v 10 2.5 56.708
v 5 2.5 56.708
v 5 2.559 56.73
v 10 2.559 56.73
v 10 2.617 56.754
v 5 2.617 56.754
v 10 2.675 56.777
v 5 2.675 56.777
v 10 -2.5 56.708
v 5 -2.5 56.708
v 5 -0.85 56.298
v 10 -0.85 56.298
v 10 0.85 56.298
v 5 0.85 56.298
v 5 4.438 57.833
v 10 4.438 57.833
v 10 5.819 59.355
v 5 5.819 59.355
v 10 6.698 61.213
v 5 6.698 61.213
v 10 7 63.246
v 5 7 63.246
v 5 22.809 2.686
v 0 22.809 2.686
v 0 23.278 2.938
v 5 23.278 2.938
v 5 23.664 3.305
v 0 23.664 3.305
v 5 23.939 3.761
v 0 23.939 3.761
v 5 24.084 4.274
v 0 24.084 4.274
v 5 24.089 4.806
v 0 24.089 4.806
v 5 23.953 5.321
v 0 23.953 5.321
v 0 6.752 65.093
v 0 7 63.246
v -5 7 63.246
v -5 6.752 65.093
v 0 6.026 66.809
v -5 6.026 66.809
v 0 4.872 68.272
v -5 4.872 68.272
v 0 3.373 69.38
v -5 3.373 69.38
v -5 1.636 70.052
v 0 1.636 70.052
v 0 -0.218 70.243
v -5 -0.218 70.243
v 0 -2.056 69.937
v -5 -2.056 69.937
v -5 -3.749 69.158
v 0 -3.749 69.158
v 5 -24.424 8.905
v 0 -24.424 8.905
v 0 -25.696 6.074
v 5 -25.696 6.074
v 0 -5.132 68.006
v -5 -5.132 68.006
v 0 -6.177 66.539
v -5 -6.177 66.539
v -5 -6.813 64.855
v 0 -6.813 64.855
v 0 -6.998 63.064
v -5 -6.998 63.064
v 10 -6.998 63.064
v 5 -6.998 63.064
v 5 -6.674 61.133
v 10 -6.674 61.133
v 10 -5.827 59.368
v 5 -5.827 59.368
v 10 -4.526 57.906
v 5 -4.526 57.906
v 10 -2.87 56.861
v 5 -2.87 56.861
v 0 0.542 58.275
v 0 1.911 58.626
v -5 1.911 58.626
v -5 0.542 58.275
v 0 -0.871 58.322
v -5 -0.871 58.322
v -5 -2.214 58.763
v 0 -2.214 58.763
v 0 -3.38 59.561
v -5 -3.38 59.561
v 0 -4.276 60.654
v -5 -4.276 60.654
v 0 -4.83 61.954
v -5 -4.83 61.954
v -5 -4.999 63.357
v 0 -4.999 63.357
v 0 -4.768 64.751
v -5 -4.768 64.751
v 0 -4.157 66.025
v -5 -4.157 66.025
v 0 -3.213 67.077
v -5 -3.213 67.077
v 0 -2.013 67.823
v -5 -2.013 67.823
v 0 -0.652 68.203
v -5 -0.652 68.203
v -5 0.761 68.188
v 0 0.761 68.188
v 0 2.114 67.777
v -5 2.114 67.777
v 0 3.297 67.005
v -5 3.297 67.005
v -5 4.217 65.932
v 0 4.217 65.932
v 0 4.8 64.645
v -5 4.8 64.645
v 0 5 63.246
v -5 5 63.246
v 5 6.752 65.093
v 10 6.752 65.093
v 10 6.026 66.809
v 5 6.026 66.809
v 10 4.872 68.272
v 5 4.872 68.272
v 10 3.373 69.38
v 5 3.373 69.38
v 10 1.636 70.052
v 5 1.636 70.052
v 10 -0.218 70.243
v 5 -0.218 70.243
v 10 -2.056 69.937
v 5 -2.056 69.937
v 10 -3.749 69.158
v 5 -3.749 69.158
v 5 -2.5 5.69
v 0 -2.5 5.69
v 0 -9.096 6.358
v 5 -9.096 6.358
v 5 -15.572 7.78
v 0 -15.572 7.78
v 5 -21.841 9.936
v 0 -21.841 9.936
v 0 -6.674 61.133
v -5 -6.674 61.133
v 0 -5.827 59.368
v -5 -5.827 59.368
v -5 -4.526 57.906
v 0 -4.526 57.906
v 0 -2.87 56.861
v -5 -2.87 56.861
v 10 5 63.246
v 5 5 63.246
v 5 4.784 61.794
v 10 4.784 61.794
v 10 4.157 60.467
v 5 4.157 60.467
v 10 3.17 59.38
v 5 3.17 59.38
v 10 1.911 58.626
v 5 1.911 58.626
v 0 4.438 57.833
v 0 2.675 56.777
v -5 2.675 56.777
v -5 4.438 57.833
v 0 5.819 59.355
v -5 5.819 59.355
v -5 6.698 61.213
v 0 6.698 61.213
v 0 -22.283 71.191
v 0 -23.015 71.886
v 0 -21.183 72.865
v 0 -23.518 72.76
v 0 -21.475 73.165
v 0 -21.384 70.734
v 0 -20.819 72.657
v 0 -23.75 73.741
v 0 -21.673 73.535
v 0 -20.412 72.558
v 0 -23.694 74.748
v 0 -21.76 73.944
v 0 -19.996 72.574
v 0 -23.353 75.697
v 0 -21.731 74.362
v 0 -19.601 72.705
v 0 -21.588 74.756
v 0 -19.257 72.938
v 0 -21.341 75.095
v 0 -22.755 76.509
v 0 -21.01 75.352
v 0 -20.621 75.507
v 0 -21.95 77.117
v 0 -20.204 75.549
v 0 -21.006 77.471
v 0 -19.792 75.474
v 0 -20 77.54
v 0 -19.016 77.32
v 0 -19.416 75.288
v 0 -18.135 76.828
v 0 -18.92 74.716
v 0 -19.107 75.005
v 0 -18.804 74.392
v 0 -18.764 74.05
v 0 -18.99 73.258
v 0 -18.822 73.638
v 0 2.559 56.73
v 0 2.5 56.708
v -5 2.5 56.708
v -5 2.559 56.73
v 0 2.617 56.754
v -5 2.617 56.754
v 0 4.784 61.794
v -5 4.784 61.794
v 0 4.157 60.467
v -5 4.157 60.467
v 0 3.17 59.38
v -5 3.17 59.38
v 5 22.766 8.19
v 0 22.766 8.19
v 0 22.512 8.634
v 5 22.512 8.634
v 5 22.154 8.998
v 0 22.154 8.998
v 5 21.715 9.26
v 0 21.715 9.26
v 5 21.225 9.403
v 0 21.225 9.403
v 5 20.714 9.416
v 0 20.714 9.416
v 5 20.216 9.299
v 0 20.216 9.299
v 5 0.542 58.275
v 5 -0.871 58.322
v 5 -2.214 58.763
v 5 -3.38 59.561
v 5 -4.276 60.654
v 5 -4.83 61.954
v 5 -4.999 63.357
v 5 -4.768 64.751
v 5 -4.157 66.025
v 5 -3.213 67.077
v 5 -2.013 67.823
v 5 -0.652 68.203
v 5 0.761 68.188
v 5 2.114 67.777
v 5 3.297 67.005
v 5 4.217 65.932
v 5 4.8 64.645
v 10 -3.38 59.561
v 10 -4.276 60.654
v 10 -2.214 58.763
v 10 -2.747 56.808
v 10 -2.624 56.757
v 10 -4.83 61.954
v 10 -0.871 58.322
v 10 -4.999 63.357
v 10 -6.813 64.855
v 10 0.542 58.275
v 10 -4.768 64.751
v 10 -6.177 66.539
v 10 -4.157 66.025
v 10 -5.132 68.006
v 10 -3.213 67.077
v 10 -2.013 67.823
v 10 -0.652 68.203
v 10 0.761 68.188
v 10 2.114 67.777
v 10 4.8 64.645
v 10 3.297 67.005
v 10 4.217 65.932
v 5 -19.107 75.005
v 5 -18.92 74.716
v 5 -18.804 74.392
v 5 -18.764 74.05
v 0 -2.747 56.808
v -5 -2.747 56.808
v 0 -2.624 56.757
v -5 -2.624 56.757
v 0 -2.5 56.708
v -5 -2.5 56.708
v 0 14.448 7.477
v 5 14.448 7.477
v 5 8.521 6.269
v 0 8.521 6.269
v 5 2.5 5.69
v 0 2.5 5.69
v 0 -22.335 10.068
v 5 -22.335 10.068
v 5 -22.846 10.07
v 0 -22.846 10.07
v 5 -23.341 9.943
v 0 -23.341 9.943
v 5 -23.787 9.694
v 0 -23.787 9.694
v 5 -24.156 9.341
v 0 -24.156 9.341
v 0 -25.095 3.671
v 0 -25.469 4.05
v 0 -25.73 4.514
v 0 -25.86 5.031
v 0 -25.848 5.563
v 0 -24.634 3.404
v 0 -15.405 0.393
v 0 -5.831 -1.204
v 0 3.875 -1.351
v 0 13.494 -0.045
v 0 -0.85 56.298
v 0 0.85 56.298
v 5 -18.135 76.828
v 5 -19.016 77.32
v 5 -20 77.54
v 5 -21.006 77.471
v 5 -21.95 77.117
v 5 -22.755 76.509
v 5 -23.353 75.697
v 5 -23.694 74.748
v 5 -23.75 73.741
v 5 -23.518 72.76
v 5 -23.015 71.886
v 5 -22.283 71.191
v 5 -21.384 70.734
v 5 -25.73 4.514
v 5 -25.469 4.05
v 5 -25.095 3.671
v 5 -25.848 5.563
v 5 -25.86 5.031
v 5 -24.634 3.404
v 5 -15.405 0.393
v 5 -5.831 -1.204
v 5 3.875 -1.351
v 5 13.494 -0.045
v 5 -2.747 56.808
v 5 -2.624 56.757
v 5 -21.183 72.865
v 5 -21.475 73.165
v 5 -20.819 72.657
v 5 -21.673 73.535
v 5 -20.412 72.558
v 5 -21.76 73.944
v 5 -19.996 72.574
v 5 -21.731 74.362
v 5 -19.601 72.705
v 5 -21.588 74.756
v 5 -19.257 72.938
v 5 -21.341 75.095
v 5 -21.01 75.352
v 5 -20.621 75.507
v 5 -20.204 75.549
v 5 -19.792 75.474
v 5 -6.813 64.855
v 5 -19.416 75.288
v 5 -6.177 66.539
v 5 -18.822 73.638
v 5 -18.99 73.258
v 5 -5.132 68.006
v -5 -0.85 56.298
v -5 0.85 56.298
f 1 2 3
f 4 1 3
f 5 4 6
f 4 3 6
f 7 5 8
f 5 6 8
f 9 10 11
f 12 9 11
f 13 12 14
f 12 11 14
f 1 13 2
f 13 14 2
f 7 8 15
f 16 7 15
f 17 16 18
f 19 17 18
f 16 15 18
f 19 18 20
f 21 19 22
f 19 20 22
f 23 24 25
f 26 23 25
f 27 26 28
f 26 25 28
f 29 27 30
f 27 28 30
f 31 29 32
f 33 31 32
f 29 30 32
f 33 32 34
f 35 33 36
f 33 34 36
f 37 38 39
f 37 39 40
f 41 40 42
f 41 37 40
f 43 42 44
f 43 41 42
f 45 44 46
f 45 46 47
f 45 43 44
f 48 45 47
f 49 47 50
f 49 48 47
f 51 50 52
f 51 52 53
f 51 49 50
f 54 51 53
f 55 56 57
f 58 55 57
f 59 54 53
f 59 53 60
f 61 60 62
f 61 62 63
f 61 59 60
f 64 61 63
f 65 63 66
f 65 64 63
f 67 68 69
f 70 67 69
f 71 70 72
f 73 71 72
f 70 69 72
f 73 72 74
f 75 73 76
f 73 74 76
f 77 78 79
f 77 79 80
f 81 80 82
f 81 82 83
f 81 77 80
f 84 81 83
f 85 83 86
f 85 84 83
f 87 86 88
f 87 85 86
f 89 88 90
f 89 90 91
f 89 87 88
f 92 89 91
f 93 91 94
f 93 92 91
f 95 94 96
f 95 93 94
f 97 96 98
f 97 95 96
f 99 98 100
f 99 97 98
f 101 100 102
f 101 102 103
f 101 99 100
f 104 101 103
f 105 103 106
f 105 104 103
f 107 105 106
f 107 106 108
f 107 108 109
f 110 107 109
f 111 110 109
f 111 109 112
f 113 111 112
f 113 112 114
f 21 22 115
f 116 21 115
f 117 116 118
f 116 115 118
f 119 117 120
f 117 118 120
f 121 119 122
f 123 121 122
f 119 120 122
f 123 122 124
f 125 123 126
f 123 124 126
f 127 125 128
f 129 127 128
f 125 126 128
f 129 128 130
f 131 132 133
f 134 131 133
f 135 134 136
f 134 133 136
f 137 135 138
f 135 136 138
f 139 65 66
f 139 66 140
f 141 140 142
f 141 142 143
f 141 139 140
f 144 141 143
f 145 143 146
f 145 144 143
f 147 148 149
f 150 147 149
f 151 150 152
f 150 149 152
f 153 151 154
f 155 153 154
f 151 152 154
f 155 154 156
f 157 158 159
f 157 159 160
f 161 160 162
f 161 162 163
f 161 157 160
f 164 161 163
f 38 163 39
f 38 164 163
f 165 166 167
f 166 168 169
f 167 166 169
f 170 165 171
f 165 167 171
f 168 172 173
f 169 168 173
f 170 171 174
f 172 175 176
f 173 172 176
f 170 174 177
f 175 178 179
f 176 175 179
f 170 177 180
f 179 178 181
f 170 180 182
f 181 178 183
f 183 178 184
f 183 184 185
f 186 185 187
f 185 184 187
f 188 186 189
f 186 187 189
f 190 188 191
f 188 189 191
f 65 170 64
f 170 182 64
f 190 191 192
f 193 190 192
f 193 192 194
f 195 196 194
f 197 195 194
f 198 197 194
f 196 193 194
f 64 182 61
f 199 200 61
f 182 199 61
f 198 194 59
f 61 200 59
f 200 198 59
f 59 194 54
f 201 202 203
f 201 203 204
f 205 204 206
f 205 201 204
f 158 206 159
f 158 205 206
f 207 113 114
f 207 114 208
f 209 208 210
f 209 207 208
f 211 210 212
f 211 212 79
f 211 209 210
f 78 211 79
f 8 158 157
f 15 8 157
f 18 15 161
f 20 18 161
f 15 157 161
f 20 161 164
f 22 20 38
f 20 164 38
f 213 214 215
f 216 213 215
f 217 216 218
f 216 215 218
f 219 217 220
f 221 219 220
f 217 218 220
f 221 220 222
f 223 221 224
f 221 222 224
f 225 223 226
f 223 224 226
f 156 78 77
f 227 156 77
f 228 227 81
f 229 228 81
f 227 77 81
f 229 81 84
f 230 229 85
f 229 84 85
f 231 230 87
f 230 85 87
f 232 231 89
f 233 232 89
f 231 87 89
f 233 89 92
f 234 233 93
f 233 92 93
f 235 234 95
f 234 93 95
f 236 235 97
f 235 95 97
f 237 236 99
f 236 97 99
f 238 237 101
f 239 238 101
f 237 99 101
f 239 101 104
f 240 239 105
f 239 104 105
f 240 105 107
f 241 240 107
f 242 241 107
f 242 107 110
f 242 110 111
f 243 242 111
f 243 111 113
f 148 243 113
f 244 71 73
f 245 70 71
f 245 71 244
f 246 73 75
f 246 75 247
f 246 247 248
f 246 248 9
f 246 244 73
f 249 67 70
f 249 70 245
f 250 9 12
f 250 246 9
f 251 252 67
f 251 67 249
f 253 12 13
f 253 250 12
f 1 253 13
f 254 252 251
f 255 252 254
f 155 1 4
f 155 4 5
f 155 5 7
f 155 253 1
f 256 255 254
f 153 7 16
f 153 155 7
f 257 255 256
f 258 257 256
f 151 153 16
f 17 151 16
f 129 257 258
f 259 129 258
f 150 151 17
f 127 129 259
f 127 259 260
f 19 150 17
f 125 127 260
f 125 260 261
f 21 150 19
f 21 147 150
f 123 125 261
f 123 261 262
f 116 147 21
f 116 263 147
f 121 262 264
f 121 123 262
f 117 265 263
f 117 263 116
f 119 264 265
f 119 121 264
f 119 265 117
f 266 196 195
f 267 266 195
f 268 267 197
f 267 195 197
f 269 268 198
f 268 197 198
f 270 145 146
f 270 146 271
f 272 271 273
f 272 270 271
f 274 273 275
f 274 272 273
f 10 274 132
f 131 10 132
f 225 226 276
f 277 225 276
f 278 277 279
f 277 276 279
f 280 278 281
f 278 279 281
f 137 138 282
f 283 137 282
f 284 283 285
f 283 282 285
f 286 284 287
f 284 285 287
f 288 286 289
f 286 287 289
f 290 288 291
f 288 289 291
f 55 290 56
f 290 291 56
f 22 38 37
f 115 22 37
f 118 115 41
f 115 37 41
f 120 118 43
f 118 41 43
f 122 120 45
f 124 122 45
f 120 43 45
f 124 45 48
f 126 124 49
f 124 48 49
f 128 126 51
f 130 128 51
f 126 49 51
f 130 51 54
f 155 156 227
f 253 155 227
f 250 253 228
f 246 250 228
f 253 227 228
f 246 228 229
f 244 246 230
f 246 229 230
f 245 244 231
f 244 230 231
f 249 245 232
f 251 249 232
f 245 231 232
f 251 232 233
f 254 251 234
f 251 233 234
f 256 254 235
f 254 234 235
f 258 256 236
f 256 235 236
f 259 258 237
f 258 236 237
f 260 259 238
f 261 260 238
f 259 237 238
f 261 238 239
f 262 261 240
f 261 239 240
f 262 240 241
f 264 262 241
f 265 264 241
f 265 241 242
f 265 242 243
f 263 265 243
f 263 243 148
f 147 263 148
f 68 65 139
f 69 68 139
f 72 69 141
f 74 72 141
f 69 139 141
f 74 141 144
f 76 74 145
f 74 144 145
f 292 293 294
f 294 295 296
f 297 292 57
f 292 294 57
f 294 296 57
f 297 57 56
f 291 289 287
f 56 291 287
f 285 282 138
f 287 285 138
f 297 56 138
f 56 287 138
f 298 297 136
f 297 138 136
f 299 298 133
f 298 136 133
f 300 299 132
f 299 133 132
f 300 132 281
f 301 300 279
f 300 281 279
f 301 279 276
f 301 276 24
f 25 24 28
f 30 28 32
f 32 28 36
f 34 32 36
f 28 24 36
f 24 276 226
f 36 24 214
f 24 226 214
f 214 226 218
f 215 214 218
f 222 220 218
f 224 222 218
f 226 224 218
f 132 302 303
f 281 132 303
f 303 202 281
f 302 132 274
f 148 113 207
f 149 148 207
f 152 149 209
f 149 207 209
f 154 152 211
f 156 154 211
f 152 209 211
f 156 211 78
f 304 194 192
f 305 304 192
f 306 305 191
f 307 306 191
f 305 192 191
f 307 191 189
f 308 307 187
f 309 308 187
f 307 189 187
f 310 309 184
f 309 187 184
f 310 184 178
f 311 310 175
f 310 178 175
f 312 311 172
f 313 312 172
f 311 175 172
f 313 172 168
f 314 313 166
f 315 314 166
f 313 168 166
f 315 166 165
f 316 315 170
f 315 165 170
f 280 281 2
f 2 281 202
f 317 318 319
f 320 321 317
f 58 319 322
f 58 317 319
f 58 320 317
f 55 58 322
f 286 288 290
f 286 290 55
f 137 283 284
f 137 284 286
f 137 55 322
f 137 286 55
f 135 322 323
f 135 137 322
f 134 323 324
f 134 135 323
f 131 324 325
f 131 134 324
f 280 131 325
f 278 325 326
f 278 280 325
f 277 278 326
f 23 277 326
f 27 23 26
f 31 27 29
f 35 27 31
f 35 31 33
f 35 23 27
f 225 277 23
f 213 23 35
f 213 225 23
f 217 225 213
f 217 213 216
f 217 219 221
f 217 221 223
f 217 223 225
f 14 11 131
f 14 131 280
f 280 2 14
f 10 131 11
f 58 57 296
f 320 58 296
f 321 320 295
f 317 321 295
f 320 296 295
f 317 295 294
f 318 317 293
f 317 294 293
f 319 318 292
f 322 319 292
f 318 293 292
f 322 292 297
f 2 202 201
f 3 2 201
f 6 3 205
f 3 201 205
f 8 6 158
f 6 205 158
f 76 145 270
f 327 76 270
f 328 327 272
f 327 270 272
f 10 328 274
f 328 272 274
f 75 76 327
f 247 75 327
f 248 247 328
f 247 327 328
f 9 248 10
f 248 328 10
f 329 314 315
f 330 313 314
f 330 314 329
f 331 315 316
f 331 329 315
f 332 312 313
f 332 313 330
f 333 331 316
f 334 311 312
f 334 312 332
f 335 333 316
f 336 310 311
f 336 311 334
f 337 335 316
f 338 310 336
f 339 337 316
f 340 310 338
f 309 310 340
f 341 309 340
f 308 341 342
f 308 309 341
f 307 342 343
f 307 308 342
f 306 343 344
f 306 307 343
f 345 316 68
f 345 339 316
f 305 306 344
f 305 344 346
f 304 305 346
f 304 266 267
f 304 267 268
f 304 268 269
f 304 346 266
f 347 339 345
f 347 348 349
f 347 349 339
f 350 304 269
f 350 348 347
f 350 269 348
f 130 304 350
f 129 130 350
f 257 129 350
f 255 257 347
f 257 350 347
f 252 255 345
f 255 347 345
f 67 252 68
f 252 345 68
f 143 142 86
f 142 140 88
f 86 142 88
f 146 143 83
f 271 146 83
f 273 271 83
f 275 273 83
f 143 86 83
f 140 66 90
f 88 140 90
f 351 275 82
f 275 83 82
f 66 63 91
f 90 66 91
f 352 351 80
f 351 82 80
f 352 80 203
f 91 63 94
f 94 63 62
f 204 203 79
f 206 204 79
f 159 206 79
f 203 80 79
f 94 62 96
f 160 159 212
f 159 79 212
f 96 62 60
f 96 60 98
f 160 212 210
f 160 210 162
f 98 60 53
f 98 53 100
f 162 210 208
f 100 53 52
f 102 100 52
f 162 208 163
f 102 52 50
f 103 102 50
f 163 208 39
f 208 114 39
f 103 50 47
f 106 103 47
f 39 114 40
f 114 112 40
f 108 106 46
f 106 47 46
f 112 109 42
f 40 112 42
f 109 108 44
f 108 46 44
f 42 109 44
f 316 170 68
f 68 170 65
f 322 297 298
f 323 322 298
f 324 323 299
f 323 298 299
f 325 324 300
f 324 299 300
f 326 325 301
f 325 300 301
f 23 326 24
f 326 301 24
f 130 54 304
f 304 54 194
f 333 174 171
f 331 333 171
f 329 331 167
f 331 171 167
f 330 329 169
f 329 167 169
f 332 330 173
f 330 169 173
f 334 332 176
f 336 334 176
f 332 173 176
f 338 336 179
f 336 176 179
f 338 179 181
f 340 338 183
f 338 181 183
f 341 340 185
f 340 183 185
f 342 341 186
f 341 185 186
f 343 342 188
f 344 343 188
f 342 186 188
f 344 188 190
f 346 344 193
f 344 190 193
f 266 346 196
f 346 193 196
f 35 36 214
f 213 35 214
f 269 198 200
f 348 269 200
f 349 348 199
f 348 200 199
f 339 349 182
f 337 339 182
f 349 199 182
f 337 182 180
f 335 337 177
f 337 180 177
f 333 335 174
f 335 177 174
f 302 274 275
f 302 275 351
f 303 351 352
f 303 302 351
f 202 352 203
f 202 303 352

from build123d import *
from build123d import SkipClean  # not in build123d's __all__

# Parameters (mm, degrees)
F1_DEPTH      = 5
F2_DEPTH      = 10
F2_DEPTH_BACK = 5


with BuildPart() as f1:
    # F0 (on Right) → F1 (new body)
    with BuildSketch(Plane.YZ):
        with BuildLine():
            ThreePointArc((-2.0497591696, 58.6855219415), (-2.7158059717, 67.4442000024), (5, 63.2460578033))
            ThreePointArc((5, 63.2460578033), (4.1565190701, 60.4669663655), (1.9106603122, 58.6255191798))
            Line((1.9106603122, 58.6255191798), (2.6749244371, 56.7773037304))
            ThreePointArc((2.6749244371, 56.7773037304), (5.8191266982, 59.3553297904), (7, 63.2460578033))
            ThreePointArc((7, 63.2460578033), (3.3734494014, 69.3795591799), (-3.7485254675, 69.1577882453))
            ThreePointArc((-3.7485254675, 69.1577882453), (-6.1768933492, 66.539382651), (-6.9976278698, 63.0638376186))
            ThreePointArc((-6.9976278698, 63.0638376186), (-5.827409471, 59.3677464624), (-2.8696628374, 56.8613075968))
            Line((-2.8696628374, 56.8613075968), (-2.0497591696, 58.6855219415))
        make_face()
        with BuildLine():
            ThreePointArc((1.9106603122, 58.6255191798), (-0.0757443456, 58.2466315568), (-2.0497591696, 58.6855219415))
            Line((-2.0497591696, 58.6855219415), (-2.8696628374, 56.8613075968))
            ThreePointArc((-2.8696628374, 56.8613075968), (-2.6859296062, 56.7818654987), (-2.5, 56.707709388))
            Line((-2.5, 56.707709388), (2.5, 56.707709388))
            ThreePointArc((2.5, 56.707709388), (2.5876961907, 56.7419184733), (2.6749244371, 56.7773037304))
            Line((2.6749244371, 56.7773037304), (1.9106603122, 58.6255191798))
        make_face()
        with BuildLine():
            Line((-21.3842253571, 70.7343179555), (-6.9976278698, 63.0638376186))
            ThreePointArc((-6.9976278698, 63.0638376186), (-6.1768933492, 66.539382651), (-3.7485254675, 69.1577882453))
            Line((-3.7485254675, 69.1577882453), (-18.1351229548, 76.8282685822))
            ThreePointArc((-18.1351229548, 76.8282685822), (-17.1255151434, 75.5992014909), (-16.7640988794, 74.0502366327))
            ThreePointArc((-16.7640988794, 74.0502366327), (-18.2233199438, 71.2067842705), (-21.3842253571, 70.7343179555))
        make_face()
        with BuildLine():
            Line((2.5, 56.707709388), (-2.5, 56.707709388))
            ThreePointArc((-2.5, 56.707709388), (0, 56.2460578033), (2.5, 56.707709388))
        make_face()
        with BuildLine():
            ThreePointArc((2.5, 56.707709388), (0, 56.2460578033), (-2.5, 56.707709388))
            Line((-2.5, 56.707709388), (-2.5, 5.6896996604))
            ThreePointArc((-2.5, 5.6896996604), (0, 5.6354306355), (2.5, 5.6896996604))
            Line((2.5, 5.6896996604), (2.5, 56.707709388))
        make_face()
        with BuildLine():
            Line((-20.412130709, 72.5575589791), (-21.3842253571, 70.7343179555))
            ThreePointArc((-21.3842253571, 70.7343179555), (-18.2233199438, 71.2067842705), (-16.7640988794, 74.0502366327))
            ThreePointArc((-16.7640988794, 74.0502366327), (-17.1255151434, 75.5992014909), (-18.1351229548, 76.8282685822))
            Line((-18.1351229548, 76.8282685822), (-19.1072176029, 75.0050275585))
            ThreePointArc((-19.1072176029, 75.0050275585), (-18.8524824452, 74.5575225901), (-18.7640988794, 74.0502366327))
            ThreePointArc((-18.7640988794, 74.0502366327), (-19.2571350629, 72.9384705277), (-20.412130709, 72.5575589791))
        make_face()
        with BuildLine():
            ThreePointArc((-18.1351229548, 76.8282685822), (-23.352545554, 75.6968990565), (-21.3842253571, 70.7343179555))
            Line((-21.3842253571, 70.7343179555), (-20.412130709, 72.5575589791))
            ThreePointArc((-20.412130709, 72.5575589791), (-21.5877188828, 74.7559491), (-19.1072176029, 75.0050275585))
            Line((-19.1072176029, 75.0050275585), (-18.1351229548, 76.8282685822))
        make_face()
        with BuildLine():
            ThreePointArc((2.5, 5.6896996604), (0, 5.6354306355), (-2.5, 5.6896996604))
            ThreePointArc((-2.5, 5.6896996604), (-12.3544556578, 6.9757122555), (-21.8412756578, 9.9361802916))
            ThreePointArc((-21.8412756578, 9.9361802916), (-23.3409375081, 9.9429800309), (-24.4237277351, 8.9053879982))
            Line((-24.4237277351, 8.9053879982), (-25.6964663445, 6.0736552965))
            ThreePointArc((-25.6964663445, 6.0736552965), (-25.7303627866, 4.5138703516), (-24.6335625617, 3.4043175994))
            ThreePointArc((-24.6335625617, 3.4043175994), (-0.9803374174, -1.4600872963), (22.8093950074, 2.6855279633))
            ThreePointArc((22.8093950074, 2.6855279633), (23.939304908, 3.7613447039), (23.9526765567, 5.3214406119))
            Line((23.9526765567, 5.3214406119), (22.7663073553, 8.1904302912))
            ThreePointArc((22.7663073553, 8.1904302912), (21.7154471881, 9.260348424), (20.2162676541, 9.2989829539))
            ThreePointArc((20.2162676541, 9.2989829539), (11.5006058756, 6.7950132854), (2.5, 5.6896996604))
        make_face()
    extrude(amount=F1_DEPTH)

    # F0 (on Right) → F2 (join, two sides)
    with BuildSketch(Plane.YZ) as f2_sk:
        with BuildLine():
            ThreePointArc((1.9106603122, 58.6255191798), (-0.0757443456, 58.2466315568), (-2.0497591696, 58.6855219415))
            Line((-2.0497591696, 58.6855219415), (-2.8696628374, 56.8613075968))
            ThreePointArc((-2.8696628374, 56.8613075968), (-2.6859296062, 56.7818654987), (-2.5, 56.707709388))
            Line((-2.5, 56.707709388), (2.5, 56.707709388))
            ThreePointArc((2.5, 56.707709388), (2.5876961907, 56.7419184733), (2.6749244371, 56.7773037304))
            Line((2.6749244371, 56.7773037304), (1.9106603122, 58.6255191798))
        make_face()
        with BuildLine():
            ThreePointArc((-2.0497591696, 58.6855219415), (-2.7158059717, 67.4442000024), (5, 63.2460578033))
            ThreePointArc((5, 63.2460578033), (4.1565190701, 60.4669663655), (1.9106603122, 58.6255191798))
            Line((1.9106603122, 58.6255191798), (2.6749244371, 56.7773037304))
            ThreePointArc((2.6749244371, 56.7773037304), (5.8191266982, 59.3553297904), (7, 63.2460578033))
            ThreePointArc((7, 63.2460578033), (3.3734494014, 69.3795591799), (-3.7485254675, 69.1577882453))
            ThreePointArc((-3.7485254675, 69.1577882453), (-6.1768933492, 66.539382651), (-6.9976278698, 63.0638376186))
            ThreePointArc((-6.9976278698, 63.0638376186), (-5.827409471, 59.3677464624), (-2.8696628374, 56.8613075968))
            Line((-2.8696628374, 56.8613075968), (-2.0497591696, 58.6855219415))
        make_face()
        with BuildLine():
            Line((2.5, 56.707709388), (-2.5, 56.707709388))
            ThreePointArc((-2.5, 56.707709388), (0, 56.2460578033), (2.5, 56.707709388))
        make_face()
    with SkipClean():  # cleaning this boolean's faces spoils the solid; the shape is the same uncleaned
        extrude(amount=F2_DEPTH)
        extrude(f2_sk.sketch, amount=-F2_DEPTH_BACK)


solid = f1.part
